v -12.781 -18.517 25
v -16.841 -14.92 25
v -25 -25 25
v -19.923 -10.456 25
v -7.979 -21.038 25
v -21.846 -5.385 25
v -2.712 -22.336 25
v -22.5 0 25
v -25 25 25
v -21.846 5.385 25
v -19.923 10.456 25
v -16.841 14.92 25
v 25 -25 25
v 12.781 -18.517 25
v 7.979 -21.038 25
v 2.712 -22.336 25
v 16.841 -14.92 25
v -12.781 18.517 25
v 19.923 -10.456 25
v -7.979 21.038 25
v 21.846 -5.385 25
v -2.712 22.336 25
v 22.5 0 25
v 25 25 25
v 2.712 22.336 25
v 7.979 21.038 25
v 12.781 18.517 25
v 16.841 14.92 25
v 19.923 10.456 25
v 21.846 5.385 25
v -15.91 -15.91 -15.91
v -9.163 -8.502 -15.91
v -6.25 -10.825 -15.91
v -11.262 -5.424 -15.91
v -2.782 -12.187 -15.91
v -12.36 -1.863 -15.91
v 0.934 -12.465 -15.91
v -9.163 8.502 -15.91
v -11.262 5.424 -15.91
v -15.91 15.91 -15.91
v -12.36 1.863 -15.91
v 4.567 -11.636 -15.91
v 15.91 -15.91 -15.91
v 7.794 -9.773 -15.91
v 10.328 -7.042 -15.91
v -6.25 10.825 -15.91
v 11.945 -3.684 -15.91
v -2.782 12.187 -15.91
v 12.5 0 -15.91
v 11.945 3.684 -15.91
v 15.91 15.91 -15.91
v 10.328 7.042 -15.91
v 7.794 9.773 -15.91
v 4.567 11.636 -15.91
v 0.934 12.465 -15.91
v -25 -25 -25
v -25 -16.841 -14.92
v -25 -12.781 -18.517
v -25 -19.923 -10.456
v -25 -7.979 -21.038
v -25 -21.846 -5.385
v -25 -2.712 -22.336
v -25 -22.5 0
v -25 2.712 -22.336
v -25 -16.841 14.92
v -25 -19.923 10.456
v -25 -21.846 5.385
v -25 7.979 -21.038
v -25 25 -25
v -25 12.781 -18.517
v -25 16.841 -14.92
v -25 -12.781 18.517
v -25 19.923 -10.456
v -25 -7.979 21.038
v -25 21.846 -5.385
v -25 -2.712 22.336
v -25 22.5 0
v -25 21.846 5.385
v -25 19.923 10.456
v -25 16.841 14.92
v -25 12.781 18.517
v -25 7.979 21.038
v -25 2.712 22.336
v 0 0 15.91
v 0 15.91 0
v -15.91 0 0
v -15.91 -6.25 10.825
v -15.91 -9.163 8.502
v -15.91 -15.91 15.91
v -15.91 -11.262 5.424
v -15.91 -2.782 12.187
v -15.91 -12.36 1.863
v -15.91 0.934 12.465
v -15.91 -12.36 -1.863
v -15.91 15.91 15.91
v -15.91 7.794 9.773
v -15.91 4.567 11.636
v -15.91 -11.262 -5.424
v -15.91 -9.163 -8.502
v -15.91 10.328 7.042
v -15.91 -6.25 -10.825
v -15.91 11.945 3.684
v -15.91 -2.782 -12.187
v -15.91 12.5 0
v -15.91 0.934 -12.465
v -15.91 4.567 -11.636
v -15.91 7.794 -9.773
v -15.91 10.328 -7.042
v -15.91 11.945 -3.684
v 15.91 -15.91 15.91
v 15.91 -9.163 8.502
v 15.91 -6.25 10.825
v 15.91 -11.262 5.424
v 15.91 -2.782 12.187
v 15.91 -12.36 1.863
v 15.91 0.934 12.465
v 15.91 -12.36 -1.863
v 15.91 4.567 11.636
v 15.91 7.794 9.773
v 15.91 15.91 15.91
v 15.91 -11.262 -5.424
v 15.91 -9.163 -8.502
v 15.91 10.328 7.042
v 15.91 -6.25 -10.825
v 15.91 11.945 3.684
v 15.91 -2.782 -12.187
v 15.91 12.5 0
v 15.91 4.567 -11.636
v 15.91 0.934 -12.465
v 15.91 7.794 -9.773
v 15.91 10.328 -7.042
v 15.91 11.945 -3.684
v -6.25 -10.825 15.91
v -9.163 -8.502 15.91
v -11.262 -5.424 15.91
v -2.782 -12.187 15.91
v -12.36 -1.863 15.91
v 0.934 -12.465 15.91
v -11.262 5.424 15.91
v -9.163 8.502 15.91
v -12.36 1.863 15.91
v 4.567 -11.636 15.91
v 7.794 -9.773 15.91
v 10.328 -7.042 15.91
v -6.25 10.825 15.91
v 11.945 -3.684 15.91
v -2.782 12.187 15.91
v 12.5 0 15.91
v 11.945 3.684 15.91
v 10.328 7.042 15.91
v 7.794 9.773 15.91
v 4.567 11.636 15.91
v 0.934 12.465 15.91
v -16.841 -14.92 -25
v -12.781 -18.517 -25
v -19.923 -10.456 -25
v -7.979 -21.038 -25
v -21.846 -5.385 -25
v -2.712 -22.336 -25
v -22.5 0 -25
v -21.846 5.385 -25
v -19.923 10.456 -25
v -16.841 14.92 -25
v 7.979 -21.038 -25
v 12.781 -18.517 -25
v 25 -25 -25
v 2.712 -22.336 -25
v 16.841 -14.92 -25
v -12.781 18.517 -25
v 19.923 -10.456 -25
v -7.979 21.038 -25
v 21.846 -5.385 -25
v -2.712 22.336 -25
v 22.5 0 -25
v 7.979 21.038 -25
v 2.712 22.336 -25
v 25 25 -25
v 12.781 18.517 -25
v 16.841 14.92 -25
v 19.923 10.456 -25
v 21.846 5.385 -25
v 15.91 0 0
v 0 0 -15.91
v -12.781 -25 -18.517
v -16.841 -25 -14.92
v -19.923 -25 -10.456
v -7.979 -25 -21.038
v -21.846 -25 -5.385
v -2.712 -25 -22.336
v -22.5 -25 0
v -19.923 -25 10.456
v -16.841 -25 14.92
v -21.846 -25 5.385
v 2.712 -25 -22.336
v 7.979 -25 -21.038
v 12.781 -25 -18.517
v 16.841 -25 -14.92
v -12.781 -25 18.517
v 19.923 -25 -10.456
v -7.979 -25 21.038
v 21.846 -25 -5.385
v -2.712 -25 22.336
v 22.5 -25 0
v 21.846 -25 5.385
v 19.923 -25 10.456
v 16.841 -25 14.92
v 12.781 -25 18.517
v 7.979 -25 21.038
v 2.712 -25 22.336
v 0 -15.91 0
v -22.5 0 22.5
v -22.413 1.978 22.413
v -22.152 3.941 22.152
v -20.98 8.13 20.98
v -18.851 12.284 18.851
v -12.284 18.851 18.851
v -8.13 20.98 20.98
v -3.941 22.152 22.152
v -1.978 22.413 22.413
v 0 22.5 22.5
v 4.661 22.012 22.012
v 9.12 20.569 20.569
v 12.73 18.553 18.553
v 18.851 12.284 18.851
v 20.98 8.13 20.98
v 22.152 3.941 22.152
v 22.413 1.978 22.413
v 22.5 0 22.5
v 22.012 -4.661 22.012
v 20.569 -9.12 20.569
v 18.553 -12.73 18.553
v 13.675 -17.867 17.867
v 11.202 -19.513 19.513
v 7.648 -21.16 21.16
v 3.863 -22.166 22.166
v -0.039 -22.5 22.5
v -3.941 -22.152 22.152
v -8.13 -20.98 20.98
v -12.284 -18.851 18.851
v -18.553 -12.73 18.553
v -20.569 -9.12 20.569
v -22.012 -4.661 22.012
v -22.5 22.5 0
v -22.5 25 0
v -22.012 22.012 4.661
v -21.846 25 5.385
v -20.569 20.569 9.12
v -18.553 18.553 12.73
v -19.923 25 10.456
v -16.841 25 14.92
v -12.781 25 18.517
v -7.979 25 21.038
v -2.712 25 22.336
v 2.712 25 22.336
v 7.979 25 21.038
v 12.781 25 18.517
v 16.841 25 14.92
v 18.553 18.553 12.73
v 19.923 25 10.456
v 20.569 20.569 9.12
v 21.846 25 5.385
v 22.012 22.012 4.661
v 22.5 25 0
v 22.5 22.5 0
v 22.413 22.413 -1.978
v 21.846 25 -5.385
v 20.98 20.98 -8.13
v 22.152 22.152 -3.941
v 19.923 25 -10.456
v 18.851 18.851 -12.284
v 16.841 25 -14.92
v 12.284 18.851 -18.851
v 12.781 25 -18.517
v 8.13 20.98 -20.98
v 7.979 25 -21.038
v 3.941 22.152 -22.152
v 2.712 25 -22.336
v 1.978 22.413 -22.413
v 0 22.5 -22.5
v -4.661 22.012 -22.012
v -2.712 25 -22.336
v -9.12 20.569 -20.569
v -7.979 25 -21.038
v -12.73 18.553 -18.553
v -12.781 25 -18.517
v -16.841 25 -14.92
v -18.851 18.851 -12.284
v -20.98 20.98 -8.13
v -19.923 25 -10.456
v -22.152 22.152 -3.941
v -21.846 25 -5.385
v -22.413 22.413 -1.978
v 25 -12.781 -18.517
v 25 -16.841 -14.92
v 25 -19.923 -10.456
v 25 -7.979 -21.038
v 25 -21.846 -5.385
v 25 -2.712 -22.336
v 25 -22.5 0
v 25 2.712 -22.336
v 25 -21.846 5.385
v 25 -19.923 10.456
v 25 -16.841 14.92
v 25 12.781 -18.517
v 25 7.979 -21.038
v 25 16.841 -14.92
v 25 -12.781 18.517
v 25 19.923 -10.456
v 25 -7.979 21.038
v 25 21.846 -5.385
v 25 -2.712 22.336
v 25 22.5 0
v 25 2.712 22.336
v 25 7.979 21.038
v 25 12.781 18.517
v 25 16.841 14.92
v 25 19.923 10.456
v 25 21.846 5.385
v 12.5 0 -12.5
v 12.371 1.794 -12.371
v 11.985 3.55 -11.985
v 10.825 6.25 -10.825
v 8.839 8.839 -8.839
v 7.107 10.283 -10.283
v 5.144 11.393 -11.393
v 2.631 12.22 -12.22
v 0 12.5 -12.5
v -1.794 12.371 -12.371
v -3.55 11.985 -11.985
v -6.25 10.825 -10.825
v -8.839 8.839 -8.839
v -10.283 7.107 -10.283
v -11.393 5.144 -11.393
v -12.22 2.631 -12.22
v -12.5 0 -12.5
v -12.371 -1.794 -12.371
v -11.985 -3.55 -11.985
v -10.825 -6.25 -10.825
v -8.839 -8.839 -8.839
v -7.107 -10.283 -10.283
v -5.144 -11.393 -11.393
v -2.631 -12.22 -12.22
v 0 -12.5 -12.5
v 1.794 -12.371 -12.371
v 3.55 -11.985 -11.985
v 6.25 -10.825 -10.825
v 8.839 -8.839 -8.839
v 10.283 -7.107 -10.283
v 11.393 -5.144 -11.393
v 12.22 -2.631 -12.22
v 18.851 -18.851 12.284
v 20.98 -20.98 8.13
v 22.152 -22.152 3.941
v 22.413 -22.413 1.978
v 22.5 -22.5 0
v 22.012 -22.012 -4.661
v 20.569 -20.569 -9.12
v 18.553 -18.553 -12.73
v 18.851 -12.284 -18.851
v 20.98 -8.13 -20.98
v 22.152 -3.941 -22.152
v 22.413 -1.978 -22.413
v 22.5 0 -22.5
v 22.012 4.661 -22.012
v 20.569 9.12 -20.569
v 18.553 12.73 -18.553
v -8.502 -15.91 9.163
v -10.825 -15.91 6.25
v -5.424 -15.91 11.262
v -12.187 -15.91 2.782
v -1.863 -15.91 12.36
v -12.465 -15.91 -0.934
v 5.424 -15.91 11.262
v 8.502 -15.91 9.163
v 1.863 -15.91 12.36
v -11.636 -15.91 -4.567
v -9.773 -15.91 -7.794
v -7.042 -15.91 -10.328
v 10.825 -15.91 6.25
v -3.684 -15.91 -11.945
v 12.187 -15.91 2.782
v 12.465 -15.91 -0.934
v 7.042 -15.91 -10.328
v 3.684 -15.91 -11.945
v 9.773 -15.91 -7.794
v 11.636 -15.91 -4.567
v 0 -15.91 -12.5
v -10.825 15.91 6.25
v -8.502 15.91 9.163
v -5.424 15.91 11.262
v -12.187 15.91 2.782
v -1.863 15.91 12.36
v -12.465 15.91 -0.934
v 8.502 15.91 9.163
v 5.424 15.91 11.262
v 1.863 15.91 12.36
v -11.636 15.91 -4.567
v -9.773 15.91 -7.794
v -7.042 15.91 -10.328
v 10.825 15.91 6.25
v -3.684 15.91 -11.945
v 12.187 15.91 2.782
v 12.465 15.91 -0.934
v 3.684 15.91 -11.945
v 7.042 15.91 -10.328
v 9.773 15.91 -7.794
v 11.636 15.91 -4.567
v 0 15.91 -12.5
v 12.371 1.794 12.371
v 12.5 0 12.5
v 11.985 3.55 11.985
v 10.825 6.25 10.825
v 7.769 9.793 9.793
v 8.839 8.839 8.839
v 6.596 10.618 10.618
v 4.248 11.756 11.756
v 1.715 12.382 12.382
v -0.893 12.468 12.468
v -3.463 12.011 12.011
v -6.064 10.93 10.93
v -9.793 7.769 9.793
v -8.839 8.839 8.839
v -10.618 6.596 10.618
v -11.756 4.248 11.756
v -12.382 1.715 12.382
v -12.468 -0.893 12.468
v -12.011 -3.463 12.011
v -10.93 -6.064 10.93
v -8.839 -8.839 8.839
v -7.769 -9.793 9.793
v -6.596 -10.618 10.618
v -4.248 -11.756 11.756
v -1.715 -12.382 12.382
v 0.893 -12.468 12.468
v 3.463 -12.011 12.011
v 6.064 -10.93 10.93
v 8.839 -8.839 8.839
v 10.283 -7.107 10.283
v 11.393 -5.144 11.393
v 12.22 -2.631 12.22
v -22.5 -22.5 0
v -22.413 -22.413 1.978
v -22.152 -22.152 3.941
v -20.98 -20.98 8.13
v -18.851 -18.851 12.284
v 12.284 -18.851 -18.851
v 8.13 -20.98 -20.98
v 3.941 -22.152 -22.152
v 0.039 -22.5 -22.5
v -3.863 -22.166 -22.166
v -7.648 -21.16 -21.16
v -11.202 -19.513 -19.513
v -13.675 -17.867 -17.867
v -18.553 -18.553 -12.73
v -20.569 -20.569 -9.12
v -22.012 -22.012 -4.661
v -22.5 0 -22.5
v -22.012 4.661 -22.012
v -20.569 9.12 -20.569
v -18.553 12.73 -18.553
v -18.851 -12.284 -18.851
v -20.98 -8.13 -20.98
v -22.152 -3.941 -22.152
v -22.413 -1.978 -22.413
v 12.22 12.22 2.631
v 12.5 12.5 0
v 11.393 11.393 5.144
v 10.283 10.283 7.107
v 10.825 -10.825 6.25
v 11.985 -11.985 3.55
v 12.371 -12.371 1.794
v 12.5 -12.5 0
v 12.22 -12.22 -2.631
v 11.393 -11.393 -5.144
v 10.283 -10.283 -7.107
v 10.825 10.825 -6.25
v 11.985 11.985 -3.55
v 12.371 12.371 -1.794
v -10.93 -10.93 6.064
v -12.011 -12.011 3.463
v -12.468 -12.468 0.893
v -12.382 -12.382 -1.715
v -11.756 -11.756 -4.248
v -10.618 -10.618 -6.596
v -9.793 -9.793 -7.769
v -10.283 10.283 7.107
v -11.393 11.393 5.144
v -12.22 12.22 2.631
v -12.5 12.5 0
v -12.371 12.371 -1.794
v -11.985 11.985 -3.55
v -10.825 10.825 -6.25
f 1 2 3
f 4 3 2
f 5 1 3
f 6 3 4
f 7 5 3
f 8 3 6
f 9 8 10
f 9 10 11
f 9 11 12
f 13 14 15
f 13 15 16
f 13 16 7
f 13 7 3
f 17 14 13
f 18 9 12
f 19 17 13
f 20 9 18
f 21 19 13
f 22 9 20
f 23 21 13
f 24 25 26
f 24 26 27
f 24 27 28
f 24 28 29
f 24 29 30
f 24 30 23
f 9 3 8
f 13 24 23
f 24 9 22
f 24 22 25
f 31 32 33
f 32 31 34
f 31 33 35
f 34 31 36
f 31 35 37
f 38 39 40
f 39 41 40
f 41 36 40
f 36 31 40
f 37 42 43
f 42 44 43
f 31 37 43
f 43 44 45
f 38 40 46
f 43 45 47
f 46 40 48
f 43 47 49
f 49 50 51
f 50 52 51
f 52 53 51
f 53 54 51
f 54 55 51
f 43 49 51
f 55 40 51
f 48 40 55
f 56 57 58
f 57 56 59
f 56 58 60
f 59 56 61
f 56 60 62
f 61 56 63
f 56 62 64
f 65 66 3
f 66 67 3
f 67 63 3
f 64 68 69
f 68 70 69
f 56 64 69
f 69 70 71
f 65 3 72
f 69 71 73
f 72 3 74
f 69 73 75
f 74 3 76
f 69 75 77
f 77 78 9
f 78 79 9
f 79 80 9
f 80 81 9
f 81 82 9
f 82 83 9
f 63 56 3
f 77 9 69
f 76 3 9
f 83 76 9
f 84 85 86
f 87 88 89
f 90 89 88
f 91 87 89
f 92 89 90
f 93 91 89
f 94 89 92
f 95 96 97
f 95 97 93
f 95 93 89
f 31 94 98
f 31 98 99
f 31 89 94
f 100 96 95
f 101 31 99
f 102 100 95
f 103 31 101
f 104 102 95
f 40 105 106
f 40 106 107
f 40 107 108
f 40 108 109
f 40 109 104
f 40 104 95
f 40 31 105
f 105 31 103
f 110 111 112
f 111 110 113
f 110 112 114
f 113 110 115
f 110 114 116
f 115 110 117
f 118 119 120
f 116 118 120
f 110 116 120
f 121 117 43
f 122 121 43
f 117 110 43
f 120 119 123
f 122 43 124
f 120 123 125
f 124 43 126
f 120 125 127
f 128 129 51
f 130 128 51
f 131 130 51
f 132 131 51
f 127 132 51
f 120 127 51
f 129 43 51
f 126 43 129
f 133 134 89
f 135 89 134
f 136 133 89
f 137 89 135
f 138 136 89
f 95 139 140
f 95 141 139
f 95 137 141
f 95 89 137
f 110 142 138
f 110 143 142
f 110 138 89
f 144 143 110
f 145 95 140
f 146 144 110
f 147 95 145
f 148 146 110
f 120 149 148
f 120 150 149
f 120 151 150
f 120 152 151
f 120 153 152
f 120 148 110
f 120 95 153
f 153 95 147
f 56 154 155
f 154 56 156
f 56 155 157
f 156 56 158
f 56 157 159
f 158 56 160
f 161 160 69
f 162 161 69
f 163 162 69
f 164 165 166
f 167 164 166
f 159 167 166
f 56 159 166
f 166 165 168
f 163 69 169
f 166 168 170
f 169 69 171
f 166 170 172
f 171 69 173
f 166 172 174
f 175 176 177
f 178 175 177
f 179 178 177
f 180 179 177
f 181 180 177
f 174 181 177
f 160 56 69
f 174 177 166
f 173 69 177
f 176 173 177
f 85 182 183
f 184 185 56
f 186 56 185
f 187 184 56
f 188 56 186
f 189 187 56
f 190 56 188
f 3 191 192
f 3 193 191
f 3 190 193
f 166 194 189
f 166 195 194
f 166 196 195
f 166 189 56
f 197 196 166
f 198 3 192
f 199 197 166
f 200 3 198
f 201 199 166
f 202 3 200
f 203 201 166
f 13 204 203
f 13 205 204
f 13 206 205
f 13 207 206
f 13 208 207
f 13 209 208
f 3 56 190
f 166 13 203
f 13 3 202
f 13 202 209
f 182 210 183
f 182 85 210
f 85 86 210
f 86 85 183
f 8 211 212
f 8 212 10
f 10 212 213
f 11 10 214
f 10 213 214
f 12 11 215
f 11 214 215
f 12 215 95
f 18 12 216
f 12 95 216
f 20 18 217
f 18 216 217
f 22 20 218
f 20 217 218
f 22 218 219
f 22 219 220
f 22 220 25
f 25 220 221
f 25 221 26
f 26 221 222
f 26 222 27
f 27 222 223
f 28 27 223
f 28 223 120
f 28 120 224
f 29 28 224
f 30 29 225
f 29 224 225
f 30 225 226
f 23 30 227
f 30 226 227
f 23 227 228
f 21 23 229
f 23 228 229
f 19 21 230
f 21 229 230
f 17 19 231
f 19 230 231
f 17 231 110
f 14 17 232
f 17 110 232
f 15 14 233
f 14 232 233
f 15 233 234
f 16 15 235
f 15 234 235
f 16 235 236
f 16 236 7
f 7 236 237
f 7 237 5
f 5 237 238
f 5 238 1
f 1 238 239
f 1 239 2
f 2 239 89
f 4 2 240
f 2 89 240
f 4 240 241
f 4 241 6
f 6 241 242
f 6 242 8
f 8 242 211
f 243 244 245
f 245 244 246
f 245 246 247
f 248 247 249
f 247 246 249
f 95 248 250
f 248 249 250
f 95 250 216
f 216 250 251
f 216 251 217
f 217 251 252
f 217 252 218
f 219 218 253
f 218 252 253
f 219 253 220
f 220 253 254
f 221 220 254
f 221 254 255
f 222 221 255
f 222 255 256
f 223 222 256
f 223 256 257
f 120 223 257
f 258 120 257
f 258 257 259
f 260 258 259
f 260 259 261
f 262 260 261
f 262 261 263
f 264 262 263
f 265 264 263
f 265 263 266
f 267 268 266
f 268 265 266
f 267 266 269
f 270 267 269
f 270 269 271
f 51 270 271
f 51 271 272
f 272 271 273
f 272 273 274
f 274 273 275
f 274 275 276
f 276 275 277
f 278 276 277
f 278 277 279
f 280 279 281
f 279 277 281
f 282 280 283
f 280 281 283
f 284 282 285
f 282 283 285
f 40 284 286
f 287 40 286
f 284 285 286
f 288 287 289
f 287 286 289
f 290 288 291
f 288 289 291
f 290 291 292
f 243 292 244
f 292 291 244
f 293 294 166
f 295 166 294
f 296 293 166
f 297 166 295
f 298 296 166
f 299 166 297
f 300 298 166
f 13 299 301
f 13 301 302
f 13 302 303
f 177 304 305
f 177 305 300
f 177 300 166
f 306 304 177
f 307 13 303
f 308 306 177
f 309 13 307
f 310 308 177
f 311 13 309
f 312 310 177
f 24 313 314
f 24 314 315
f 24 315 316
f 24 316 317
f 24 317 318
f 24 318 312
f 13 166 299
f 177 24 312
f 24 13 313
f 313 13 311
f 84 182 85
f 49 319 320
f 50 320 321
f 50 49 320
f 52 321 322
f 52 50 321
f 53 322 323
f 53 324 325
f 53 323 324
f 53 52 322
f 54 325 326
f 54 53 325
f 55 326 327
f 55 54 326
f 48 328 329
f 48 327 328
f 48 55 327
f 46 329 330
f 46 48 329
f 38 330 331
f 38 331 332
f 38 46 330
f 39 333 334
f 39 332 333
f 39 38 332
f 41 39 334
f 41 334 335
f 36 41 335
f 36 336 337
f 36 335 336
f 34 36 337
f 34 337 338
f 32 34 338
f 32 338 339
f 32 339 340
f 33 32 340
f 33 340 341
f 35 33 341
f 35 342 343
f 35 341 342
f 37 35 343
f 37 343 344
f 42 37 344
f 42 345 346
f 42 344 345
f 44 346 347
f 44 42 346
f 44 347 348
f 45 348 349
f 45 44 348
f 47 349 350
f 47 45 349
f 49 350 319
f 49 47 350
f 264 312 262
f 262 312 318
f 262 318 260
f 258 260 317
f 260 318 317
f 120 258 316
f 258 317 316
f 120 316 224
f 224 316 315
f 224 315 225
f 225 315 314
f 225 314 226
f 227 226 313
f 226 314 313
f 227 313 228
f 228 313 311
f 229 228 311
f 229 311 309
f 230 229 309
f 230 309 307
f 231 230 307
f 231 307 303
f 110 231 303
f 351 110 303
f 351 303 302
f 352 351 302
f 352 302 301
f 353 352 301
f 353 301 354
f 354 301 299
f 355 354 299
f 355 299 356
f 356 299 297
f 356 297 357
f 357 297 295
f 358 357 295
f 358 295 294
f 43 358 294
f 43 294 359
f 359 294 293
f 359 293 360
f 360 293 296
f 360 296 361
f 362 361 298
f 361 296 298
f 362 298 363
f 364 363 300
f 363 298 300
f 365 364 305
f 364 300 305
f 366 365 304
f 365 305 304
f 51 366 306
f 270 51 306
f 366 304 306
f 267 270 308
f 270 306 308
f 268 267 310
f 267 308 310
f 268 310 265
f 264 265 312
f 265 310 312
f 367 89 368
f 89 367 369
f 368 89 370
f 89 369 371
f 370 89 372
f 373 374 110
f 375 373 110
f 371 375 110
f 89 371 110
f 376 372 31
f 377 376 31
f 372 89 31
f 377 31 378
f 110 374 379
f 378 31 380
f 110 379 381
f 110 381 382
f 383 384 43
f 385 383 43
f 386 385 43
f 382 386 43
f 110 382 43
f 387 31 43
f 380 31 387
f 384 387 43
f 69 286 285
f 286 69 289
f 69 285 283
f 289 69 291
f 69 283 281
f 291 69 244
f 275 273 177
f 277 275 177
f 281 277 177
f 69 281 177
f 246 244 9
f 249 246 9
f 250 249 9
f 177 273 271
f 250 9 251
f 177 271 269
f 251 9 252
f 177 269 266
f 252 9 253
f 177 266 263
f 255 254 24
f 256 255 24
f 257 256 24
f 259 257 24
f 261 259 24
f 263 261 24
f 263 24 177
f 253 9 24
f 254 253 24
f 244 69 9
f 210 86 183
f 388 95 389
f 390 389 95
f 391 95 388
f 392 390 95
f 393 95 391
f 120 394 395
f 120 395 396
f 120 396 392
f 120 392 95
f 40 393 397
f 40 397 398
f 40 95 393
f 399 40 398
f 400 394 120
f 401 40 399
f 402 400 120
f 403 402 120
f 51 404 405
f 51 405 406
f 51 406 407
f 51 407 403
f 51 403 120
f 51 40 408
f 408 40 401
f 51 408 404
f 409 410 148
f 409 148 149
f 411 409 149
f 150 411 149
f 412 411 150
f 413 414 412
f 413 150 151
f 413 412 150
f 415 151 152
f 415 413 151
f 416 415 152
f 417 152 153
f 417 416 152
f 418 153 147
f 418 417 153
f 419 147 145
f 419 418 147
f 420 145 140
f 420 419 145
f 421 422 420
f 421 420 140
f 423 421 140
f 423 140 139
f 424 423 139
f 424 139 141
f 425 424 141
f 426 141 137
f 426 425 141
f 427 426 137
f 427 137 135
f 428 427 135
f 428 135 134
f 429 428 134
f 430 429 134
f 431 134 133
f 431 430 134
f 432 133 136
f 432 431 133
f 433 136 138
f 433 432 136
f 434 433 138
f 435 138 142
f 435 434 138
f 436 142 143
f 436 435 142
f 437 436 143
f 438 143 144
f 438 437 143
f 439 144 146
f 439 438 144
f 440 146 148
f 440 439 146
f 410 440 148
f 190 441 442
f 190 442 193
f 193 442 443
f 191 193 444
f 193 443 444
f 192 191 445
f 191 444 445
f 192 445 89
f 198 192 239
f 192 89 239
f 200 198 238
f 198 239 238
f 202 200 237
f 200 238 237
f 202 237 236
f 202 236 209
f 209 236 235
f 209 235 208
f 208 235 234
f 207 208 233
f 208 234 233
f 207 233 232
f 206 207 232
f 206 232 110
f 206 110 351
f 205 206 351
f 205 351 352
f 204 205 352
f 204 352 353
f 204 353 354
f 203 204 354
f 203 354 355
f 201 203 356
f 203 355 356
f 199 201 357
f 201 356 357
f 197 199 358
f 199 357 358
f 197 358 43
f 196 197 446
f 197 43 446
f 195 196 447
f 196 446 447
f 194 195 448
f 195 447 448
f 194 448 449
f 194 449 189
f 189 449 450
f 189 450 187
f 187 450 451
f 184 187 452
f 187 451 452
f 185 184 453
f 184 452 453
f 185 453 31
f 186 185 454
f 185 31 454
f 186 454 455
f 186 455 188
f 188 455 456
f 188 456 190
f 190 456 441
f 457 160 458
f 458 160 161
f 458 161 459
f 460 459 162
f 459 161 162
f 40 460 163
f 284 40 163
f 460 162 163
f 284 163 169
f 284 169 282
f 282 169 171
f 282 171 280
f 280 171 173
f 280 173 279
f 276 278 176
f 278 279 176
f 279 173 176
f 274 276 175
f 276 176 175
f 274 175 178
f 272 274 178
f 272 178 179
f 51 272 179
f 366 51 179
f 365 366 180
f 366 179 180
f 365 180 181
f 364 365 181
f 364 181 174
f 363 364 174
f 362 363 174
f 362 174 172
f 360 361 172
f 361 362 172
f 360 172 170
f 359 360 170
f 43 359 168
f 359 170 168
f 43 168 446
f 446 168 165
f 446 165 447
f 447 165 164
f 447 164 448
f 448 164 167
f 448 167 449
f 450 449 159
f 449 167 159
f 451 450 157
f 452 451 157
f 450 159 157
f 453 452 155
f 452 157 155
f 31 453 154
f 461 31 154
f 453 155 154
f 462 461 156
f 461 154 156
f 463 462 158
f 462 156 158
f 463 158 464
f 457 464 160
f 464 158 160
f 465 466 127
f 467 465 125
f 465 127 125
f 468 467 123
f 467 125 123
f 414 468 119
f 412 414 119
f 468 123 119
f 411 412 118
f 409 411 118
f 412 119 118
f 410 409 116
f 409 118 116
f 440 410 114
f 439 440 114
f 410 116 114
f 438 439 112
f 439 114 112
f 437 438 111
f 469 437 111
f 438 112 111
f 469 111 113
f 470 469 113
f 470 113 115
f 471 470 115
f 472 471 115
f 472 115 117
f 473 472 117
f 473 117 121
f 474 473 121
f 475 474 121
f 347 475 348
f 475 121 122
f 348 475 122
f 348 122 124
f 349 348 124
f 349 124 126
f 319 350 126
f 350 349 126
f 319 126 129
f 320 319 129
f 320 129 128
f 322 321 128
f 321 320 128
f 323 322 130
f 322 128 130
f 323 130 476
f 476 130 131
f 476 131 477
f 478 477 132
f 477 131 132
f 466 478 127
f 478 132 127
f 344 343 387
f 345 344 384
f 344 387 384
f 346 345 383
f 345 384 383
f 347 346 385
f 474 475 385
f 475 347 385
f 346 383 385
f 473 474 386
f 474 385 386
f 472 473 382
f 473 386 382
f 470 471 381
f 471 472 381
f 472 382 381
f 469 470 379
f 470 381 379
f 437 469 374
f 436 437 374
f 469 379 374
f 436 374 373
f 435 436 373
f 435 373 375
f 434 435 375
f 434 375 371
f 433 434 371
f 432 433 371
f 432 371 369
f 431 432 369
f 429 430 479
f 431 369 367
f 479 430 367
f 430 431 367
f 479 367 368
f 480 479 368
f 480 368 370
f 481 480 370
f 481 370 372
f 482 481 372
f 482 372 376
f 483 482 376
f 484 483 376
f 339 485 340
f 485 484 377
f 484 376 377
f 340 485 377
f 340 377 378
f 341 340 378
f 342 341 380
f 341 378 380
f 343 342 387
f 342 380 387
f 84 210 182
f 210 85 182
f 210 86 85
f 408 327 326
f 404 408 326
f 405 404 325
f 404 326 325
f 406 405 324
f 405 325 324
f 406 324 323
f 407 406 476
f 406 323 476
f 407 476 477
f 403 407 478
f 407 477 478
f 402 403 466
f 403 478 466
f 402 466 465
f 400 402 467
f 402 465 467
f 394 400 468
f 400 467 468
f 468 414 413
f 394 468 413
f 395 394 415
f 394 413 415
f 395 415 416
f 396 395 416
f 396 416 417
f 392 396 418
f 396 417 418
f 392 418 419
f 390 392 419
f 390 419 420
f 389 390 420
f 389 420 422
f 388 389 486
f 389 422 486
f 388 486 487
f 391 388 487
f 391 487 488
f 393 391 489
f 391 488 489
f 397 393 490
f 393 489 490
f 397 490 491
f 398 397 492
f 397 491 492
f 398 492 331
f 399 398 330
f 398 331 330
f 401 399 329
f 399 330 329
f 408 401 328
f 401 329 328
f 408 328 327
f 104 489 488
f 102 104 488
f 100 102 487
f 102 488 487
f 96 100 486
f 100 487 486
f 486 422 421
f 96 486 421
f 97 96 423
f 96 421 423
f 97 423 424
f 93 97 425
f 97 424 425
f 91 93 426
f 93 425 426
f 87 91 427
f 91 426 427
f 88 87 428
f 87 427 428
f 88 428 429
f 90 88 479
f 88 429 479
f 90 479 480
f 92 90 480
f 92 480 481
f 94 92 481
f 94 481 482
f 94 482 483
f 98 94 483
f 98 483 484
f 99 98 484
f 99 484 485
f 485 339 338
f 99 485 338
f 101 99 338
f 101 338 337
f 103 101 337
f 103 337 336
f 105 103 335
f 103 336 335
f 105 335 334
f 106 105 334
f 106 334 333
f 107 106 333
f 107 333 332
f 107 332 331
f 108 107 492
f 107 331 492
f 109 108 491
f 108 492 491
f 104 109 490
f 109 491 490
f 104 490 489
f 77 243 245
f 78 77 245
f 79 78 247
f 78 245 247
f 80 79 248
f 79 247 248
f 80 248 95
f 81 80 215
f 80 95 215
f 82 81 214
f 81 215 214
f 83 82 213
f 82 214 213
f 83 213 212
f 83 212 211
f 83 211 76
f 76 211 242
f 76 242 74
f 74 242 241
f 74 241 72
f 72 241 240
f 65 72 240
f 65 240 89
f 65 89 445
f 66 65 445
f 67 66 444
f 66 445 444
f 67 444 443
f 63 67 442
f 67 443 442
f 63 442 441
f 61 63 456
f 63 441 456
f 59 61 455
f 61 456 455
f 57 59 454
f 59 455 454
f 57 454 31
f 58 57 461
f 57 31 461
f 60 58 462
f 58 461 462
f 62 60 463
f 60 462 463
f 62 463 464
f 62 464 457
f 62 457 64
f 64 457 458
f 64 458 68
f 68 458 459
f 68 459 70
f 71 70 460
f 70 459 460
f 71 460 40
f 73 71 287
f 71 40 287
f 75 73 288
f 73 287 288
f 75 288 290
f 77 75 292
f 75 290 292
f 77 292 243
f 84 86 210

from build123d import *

# Parameters (mm, degrees)
SKETCH_1_W               = 50
SKETCH_1_H               = 50
EXTRUDE_1_DEPTH          = 25
SKETCH_2_R               = 22.5
CUT_EXTRUDE_1_DEPTH      = 62.23724357
PATTERN_CIRCULAR_1_COUNT = 4
SKETCH_3_R               = 22.5
CUT_EXTRUDE_2_DEPTH      = 62.23724357
EXTRUDE_3_DEPTH          = 15.909903
EXTRUDE_3_DEPTH_BACK     = 15.909903
SKETCH_4_W               = 31.819805154
SKETCH_4_H               = 31.819805154
SKETCH_4_R               = 12.5
CUT_EXTRUDE_4_REACH      = 56.071
SKETCH_6_R               = 12.5
CUT_EXTRUDE_5_REACH      = 56.071
SKETCH_7_R               = 12.5


with BuildPart() as part:
    # 草图1 → 凸台-拉伸1 (new, symmetric)
    with BuildSketch(Plane.XY):
        Rectangle(SKETCH_1_W, SKETCH_1_H)
    extrude(amount=EXTRUDE_1_DEPTH, both=True)

    # 草图2 → 切除-拉伸1 (cut, through all)
    with BuildSketch(Plane(origin=(25, 0, 0), x_dir=(0, 0, -1), z_dir=(1, 0, 0))):
        with Locations(Location((0, 0, 0), (0, 0, 90))):
            Circle(SKETCH_2_R)
    cut_extrude_1 = extrude(amount=-CUT_EXTRUDE_1_DEPTH, mode=Mode.SUBTRACT)

    # 阵列(圆周)1: 切除-拉伸1 ×4 about axis
    pattern_circular_1_axis = Axis((0, 0, 0), (0, 0, 1))
    for i in range(1, PATTERN_CIRCULAR_1_COUNT):
        add(cut_extrude_1.rotate(pattern_circular_1_axis, i * 360 / PATTERN_CIRCULAR_1_COUNT), mode=Mode.SUBTRACT)

    # 草图3 → 切除-拉伸2 (cut, through all)
    with BuildSketch(Plane(origin=(0, 0, -25), x_dir=(-1, 0, 0), z_dir=(0, 0, -1))):
        Circle(SKETCH_3_R)
    extrude(amount=-CUT_EXTRUDE_2_DEPTH, mode=Mode.SUBTRACT)


with BuildPart() as body_2:
    # 草图4 → 凸台-拉伸3 (new, two sides: drawn at the far end of the back side and taken through both)
    with BuildSketch(Plane.XY.offset(-EXTRUDE_3_DEPTH_BACK)):
        Rectangle(SKETCH_4_W, SKETCH_4_H)
        Circle(SKETCH_4_R, mode=Mode.SUBTRACT)
    extrude(amount=EXTRUDE_3_DEPTH + EXTRUDE_3_DEPTH_BACK)

    # 切除-拉伸4: up to this face of the body (flat: up to its plane)
    cut_extrude_4_end = Plane(body_2.part.faces().sort_by_distance((-15.909902577, 0, 0))[0])
    # 草图6 → 切除-拉伸4 (cut, up to the picked face)
    with BuildSketch(Plane(origin=(15.909902577, 0, 0), x_dir=(0, 0, -1), z_dir=(1, 0, 0)), mode=Mode.PRIVATE) as cut_extrude_4_sk1:
        with Locations(Location((0, 0, 0), (0, 0, 90))):
            Circle(SKETCH_6_R)
    cut_extrude_4_tool1 = split(extrude(cut_extrude_4_sk1.sketch, amount=-CUT_EXTRUDE_4_REACH, mode=Mode.PRIVATE), bisect_by=cut_extrude_4_end, keep=Keep.BOTH, mode=Mode.PRIVATE)
    add(cut_extrude_4_tool1.solids().sort_by(Axis((15.909903, 0, 0), (-1, 0, 0)))[0], mode=Mode.SUBTRACT)

    # 切除-拉伸5: up to this face of the body (flat: up to its plane)
    cut_extrude_5_end = Plane(body_2.part.faces().sort_by_distance((0, 15.909902577, 0))[0])
    # 草图7 → 切除-拉伸5 (cut, up to the picked face)
    with BuildSketch(Plane.XZ.offset(15.909902577), mode=Mode.PRIVATE) as cut_extrude_5_sk1:
        with Locations(Location((0, 0, 0), (0, 0, 270))):
            Circle(SKETCH_7_R)
    cut_extrude_5_tool1 = split(extrude(cut_extrude_5_sk1.sketch, amount=-CUT_EXTRUDE_5_REACH, mode=Mode.PRIVATE), bisect_by=cut_extrude_5_end, keep=Keep.BOTH, mode=Mode.PRIVATE)
    add(cut_extrude_5_tool1.solids().sort_by(Axis((0, -15.909903, 0), (0, 1, 0)))[0], mode=Mode.SUBTRACT)


with BuildPart() as body_3:
    # 草图14 → 放样3 section 0
    with BuildSketch(Plane.XY, mode=Mode.PRIVATE) as loft_3_s0:
        with BuildLine():
            Line((0, 15.909902577), (-15.909902577, 0))
            Line((-15.909902577, 0), (0, -15.909902577))
            Line((0, -15.909902577), (15.909902577, 0))
            Line((15.909902577, 0), (0, 15.909902577))
        make_face()
    loft([loft_3_s0.sketch, Vertex(0, 0, 15.909902577)])


with BuildPart() as body_4:
    # 镜向3: mirrored copy
    add(body_3.part.mirror(Plane.XY))


solid = Compound([part.part, body_2.part, body_3.part, body_4.part])
